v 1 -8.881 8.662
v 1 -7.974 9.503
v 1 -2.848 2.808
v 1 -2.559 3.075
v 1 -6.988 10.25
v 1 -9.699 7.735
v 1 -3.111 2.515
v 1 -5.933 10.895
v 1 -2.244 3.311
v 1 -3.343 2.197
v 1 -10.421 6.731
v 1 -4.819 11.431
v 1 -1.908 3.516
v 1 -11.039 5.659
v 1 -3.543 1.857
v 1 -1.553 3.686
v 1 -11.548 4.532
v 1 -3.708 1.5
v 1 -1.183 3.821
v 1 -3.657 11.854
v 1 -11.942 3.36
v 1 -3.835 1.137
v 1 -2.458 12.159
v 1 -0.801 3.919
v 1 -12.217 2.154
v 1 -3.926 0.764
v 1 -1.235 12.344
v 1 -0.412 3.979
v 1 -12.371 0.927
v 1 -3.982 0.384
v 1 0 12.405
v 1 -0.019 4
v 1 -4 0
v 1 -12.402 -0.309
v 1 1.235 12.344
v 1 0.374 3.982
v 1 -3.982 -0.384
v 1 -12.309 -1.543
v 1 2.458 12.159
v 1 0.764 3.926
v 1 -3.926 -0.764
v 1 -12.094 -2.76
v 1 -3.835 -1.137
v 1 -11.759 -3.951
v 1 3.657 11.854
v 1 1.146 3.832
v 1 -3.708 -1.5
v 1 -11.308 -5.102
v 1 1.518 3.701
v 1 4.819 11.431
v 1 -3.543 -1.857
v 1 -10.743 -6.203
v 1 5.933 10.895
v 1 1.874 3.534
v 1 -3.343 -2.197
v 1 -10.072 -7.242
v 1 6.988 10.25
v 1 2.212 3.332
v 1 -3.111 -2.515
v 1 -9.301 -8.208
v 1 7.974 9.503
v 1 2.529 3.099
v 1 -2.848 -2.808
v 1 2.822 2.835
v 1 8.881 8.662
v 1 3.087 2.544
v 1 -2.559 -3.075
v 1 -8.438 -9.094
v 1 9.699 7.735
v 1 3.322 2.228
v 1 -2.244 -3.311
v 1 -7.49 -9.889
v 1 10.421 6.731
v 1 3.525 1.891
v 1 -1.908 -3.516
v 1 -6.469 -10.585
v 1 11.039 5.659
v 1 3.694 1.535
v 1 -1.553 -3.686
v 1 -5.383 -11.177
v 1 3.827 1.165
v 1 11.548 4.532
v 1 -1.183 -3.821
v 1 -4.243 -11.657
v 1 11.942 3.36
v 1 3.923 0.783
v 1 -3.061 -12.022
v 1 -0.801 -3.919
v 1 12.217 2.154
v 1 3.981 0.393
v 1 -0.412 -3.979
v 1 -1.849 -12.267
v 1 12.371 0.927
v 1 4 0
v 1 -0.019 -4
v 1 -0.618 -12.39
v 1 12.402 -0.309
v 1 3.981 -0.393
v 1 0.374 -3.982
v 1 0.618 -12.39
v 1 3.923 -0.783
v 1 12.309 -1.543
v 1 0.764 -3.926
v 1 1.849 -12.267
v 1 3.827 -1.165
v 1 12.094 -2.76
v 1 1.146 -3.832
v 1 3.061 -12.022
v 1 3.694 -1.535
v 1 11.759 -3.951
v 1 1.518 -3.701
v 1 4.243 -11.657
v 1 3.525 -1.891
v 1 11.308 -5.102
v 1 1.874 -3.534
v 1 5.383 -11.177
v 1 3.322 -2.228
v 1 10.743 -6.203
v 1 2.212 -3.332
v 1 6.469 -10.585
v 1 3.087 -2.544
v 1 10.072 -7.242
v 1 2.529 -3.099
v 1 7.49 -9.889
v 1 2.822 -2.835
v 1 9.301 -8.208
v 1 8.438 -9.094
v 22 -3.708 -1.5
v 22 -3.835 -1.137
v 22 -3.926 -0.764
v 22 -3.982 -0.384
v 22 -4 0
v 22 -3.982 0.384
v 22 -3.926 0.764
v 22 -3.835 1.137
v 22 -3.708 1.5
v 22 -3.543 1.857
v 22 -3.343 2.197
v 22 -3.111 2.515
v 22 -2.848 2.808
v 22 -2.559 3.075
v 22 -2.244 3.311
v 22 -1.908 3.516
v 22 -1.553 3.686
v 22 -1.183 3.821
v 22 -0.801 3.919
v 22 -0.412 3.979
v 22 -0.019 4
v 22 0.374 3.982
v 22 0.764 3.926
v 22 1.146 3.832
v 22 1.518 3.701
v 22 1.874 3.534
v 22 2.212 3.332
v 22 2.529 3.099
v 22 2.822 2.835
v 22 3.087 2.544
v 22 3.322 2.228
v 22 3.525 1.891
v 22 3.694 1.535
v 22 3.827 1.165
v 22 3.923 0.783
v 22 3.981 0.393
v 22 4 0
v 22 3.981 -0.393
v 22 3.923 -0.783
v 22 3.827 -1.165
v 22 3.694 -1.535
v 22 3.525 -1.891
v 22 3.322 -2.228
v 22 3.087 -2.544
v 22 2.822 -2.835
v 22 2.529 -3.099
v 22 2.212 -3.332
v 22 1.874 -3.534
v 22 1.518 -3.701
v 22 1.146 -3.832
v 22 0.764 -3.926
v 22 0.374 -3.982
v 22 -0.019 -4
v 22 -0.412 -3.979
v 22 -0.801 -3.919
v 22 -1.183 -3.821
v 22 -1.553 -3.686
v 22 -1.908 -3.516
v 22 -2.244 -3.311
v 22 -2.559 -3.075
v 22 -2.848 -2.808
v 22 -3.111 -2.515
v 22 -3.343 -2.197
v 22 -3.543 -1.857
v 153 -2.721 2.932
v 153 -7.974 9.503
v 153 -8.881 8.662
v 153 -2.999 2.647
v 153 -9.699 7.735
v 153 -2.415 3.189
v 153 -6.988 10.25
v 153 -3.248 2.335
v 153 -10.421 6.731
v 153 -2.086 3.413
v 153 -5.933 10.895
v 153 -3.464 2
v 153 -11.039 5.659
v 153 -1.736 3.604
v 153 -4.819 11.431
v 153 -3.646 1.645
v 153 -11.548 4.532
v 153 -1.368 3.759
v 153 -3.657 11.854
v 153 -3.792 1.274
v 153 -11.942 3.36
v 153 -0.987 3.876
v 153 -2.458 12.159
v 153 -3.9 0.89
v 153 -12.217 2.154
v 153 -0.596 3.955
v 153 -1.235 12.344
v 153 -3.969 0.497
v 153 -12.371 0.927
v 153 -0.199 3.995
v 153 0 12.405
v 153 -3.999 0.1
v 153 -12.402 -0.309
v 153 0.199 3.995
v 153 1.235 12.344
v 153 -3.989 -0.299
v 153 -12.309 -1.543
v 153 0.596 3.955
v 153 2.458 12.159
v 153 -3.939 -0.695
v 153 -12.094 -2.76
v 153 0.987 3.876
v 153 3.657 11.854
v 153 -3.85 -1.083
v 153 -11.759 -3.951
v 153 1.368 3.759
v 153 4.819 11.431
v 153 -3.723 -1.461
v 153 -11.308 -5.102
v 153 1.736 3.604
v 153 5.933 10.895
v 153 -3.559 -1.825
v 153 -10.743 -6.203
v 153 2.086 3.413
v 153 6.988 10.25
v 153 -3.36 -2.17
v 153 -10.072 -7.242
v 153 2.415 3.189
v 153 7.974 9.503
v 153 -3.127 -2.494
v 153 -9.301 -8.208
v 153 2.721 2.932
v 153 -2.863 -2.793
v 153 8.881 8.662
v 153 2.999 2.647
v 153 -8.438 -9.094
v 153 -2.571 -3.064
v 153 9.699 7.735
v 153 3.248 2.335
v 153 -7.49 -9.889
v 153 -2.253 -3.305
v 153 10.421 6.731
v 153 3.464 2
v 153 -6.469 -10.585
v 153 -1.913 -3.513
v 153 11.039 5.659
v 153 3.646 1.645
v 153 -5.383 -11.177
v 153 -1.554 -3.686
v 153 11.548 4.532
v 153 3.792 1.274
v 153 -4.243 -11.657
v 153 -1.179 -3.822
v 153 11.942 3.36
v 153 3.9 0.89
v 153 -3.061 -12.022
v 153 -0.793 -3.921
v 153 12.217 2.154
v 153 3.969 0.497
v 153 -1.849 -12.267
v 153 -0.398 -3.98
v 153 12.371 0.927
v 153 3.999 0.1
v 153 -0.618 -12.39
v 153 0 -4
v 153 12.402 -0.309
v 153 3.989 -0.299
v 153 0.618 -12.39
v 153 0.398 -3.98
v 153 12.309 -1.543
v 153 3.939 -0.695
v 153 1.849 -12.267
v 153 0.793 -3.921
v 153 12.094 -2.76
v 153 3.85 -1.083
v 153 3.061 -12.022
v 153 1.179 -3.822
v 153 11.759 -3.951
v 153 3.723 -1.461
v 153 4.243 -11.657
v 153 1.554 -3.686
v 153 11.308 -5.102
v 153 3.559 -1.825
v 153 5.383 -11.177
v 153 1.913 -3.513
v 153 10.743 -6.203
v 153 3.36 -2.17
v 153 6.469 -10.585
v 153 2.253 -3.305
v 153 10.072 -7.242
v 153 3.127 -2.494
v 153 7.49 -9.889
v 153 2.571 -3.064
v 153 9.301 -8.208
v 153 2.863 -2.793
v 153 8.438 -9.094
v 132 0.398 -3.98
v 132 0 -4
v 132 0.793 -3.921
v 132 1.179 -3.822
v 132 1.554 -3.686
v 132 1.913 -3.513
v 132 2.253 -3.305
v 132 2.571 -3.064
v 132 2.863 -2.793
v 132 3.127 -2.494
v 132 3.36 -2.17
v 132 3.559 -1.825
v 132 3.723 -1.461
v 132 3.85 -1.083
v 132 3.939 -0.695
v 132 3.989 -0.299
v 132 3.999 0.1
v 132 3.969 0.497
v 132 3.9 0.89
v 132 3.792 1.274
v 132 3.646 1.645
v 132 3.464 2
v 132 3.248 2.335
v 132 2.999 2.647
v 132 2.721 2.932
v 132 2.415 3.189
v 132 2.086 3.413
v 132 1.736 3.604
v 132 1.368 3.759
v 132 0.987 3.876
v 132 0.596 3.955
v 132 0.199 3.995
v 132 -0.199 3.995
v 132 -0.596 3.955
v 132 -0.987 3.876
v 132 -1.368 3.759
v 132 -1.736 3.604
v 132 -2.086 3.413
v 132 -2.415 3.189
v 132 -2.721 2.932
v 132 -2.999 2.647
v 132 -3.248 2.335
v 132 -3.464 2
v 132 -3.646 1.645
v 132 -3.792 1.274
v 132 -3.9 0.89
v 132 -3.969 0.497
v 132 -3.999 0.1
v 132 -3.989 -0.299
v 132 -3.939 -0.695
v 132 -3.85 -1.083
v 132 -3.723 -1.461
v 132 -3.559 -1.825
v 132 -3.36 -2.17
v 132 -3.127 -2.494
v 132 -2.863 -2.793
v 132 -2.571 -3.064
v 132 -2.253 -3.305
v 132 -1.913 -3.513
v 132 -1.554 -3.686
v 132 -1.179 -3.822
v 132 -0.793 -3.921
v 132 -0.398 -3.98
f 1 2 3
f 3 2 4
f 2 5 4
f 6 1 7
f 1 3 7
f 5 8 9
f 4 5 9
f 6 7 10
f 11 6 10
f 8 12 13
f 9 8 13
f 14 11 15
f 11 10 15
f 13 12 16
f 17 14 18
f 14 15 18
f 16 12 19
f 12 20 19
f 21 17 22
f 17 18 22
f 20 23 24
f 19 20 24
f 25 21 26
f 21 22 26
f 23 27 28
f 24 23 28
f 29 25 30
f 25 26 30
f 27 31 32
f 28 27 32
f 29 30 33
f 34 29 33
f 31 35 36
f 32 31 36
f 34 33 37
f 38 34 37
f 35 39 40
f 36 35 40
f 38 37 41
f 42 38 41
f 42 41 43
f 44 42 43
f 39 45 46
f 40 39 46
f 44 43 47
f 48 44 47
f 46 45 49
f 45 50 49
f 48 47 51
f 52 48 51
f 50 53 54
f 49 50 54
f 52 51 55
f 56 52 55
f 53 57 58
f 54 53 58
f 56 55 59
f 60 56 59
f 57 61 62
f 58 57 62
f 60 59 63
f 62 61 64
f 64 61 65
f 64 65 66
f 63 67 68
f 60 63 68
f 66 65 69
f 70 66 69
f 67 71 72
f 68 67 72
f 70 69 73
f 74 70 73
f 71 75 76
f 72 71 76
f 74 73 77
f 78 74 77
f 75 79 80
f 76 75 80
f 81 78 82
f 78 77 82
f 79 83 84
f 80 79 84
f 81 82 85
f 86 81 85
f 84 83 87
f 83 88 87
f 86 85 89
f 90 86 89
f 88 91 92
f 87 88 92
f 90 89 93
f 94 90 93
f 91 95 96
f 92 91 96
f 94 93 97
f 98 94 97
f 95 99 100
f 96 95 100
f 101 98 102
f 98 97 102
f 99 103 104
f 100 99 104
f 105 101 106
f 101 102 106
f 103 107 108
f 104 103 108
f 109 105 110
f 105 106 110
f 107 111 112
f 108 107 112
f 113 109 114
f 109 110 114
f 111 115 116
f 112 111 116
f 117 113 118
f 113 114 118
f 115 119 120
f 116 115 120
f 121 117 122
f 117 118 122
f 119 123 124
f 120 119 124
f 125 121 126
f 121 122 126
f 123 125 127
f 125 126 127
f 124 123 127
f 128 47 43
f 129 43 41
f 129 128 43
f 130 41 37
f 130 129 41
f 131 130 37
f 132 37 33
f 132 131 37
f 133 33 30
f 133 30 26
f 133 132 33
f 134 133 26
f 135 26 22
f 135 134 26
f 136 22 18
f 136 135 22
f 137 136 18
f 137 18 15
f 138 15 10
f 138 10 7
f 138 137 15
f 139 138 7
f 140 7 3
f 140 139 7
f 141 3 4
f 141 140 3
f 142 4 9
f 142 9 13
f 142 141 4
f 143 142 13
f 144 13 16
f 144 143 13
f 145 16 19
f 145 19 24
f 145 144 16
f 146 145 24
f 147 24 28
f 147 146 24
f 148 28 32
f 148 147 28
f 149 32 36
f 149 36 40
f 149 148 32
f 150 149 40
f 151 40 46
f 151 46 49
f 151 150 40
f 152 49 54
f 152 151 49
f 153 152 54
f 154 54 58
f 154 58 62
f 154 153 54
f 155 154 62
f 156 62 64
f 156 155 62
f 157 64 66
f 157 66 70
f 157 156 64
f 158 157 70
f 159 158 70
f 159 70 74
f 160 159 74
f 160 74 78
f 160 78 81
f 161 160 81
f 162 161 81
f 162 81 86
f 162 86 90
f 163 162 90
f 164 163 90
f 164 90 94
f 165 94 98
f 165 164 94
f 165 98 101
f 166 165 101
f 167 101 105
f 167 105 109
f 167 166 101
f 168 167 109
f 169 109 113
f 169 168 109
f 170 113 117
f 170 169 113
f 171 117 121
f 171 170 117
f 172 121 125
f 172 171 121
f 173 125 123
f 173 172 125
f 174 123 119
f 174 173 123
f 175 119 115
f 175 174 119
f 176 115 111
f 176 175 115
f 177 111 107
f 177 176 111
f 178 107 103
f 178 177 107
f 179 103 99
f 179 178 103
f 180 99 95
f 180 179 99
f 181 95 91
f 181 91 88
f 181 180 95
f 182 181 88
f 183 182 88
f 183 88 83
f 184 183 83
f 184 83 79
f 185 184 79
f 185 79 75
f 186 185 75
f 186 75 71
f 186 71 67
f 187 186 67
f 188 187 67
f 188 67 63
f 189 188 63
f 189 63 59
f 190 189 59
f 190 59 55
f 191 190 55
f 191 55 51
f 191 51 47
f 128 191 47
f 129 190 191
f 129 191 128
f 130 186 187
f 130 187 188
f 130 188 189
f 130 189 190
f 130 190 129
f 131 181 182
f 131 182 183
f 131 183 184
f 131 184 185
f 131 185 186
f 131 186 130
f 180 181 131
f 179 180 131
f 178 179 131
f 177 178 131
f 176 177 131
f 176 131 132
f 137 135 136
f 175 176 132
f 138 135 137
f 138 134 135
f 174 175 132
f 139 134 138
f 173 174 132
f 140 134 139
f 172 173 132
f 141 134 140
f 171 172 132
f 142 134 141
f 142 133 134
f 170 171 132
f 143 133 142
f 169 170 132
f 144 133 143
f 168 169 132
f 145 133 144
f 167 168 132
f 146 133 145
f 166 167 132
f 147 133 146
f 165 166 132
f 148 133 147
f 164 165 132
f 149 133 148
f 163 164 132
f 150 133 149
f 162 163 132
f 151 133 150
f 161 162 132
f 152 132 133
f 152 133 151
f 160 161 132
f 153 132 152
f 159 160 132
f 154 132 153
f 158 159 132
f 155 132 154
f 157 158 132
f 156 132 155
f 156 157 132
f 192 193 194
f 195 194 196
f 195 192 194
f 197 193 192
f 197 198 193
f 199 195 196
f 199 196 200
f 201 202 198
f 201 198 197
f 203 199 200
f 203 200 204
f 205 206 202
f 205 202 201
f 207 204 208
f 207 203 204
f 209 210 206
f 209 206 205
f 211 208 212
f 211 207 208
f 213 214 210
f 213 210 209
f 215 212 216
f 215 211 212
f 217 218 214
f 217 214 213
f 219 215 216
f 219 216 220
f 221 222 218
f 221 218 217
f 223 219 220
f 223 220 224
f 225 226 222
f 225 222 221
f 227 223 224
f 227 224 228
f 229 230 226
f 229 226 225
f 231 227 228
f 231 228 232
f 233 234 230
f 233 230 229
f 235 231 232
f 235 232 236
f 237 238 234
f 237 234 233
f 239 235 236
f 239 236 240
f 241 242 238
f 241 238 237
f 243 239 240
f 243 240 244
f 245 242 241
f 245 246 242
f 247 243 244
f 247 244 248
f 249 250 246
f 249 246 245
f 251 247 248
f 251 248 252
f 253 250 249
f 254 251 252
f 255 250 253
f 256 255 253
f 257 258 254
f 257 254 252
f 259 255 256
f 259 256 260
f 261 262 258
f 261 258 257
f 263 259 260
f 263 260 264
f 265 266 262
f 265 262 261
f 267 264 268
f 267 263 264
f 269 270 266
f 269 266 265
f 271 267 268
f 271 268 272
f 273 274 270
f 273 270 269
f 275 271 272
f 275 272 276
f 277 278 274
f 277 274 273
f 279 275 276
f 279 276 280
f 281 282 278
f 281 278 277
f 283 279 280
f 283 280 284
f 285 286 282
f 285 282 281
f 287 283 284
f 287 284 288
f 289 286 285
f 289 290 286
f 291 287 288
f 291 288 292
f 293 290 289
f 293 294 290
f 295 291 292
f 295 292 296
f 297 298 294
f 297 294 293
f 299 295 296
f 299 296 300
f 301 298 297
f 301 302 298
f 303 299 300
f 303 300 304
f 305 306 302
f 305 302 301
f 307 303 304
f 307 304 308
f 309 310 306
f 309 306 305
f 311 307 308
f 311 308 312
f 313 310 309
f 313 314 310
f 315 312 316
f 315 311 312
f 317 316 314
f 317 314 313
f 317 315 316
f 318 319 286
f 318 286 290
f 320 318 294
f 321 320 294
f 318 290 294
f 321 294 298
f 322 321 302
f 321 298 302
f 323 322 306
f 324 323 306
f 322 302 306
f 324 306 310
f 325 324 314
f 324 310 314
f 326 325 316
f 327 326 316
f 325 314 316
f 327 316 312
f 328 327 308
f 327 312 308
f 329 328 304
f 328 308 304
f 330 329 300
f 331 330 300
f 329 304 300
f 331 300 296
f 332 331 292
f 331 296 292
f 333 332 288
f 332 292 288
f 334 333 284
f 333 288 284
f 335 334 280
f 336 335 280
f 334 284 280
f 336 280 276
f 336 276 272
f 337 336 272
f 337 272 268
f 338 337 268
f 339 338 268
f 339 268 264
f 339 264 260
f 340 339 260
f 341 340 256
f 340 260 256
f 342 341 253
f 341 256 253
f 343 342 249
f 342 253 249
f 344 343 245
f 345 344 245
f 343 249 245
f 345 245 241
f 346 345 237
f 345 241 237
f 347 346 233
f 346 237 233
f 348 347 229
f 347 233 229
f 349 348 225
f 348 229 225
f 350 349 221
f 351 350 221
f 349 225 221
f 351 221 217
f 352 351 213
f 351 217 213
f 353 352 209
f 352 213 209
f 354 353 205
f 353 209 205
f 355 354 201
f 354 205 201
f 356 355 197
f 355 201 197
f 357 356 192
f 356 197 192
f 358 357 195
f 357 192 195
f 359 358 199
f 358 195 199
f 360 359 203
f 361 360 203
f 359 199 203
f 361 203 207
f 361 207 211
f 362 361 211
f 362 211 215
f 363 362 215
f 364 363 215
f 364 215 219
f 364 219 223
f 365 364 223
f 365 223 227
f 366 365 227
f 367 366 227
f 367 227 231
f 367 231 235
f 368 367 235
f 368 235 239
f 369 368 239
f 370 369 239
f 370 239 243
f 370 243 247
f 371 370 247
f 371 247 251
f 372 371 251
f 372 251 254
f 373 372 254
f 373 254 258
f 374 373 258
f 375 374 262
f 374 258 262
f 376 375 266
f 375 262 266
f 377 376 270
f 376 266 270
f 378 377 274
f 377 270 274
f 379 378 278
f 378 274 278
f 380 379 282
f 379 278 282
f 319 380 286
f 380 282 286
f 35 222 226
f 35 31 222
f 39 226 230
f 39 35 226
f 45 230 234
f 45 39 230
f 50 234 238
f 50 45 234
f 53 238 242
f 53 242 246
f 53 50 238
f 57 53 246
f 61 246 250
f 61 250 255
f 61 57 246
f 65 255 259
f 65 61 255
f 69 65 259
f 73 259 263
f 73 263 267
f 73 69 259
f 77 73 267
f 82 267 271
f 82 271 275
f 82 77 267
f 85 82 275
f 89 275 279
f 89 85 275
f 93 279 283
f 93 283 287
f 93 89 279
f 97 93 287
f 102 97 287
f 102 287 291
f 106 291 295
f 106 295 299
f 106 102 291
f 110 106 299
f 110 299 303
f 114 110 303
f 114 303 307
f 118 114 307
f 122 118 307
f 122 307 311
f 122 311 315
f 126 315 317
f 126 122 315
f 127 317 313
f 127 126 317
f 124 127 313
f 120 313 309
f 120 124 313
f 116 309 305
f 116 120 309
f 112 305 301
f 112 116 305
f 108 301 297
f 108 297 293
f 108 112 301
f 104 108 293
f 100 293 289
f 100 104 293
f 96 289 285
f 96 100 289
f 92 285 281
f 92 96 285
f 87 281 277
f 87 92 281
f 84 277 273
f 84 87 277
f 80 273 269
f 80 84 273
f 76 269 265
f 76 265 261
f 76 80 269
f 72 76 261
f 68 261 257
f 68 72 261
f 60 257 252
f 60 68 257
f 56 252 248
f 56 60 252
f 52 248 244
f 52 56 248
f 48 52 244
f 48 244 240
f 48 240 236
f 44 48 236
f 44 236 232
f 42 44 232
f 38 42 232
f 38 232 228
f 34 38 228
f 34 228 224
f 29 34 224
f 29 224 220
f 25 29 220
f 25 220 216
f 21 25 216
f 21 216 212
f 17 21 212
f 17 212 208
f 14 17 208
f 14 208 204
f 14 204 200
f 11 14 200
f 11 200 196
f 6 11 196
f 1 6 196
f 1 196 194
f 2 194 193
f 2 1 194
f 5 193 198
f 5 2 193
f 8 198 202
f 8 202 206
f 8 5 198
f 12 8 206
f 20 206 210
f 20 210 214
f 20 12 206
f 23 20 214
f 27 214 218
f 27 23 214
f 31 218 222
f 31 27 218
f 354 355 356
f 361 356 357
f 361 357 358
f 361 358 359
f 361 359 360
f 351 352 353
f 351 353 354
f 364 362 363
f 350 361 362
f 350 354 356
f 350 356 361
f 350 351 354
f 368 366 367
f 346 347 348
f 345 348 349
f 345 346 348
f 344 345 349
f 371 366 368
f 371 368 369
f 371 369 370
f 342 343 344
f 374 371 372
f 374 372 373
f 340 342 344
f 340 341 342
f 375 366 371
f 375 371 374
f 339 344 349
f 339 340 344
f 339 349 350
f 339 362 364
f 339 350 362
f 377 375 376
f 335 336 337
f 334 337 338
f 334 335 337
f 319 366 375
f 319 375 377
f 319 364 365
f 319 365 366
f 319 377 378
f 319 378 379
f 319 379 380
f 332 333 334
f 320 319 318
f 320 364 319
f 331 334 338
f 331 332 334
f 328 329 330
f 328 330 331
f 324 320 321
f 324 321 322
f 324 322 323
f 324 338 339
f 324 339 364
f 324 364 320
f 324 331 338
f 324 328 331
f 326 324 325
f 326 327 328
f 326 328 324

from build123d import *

# Parameters (mm, degrees)
IZIM1_W               = 152
IZIM1_H               = 12.405405405
IZIM2_R               = 4
KES_EKSTR_ZYON1_DEPTH = 21
KES_EKSTR_ZYON2_START = -21
KES_EKSTR_ZYON2_DEPTH = 21


with BuildPart() as part:
    # Çizim1 → Döndür1 (revolve)
    with BuildSketch(Plane(origin=(0, 0, 0), x_dir=(-1, 0, 0), z_dir=(0, 0, -1)), mode=Mode.PRIVATE) as d_nd_r1_sk:
        with Locations((-77, 6.202702703)):
            Rectangle(IZIM1_W, IZIM1_H)
    revolve(d_nd_r1_sk.sketch.rotate(Axis((153, 0, 0), (-1, 0, 0)), 270), axis=Axis((153, 0, 0), (-1, 0, 0)))

    # Çizim2 → Kes-Ekstrüzyon1 (cut)
    with BuildSketch(Plane(origin=(153, 0, 0), x_dir=(0, 0, -1), z_dir=(1, 0, 0))):
        Circle(IZIM2_R)
    extrude(amount=-KES_EKSTR_ZYON1_DEPTH, mode=Mode.SUBTRACT)

    # Çizim3 → Kes-Ekstrüzyon2 (cut)
    with BuildSketch(Plane.ZY.offset(-1).offset(KES_EKSTR_ZYON2_START)):
        with BuildLine():
            ThreePointArc((1.5, -3.708099244), (0, 4), (-1.5, -3.708099244))
            ThreePointArc((-1.5, -3.708099244), (0, -4), (1.5, -3.708099244))
        make_face()
    extrude(amount=KES_EKSTR_ZYON2_DEPTH, mode=Mode.SUBTRACT)


solid = part.part
